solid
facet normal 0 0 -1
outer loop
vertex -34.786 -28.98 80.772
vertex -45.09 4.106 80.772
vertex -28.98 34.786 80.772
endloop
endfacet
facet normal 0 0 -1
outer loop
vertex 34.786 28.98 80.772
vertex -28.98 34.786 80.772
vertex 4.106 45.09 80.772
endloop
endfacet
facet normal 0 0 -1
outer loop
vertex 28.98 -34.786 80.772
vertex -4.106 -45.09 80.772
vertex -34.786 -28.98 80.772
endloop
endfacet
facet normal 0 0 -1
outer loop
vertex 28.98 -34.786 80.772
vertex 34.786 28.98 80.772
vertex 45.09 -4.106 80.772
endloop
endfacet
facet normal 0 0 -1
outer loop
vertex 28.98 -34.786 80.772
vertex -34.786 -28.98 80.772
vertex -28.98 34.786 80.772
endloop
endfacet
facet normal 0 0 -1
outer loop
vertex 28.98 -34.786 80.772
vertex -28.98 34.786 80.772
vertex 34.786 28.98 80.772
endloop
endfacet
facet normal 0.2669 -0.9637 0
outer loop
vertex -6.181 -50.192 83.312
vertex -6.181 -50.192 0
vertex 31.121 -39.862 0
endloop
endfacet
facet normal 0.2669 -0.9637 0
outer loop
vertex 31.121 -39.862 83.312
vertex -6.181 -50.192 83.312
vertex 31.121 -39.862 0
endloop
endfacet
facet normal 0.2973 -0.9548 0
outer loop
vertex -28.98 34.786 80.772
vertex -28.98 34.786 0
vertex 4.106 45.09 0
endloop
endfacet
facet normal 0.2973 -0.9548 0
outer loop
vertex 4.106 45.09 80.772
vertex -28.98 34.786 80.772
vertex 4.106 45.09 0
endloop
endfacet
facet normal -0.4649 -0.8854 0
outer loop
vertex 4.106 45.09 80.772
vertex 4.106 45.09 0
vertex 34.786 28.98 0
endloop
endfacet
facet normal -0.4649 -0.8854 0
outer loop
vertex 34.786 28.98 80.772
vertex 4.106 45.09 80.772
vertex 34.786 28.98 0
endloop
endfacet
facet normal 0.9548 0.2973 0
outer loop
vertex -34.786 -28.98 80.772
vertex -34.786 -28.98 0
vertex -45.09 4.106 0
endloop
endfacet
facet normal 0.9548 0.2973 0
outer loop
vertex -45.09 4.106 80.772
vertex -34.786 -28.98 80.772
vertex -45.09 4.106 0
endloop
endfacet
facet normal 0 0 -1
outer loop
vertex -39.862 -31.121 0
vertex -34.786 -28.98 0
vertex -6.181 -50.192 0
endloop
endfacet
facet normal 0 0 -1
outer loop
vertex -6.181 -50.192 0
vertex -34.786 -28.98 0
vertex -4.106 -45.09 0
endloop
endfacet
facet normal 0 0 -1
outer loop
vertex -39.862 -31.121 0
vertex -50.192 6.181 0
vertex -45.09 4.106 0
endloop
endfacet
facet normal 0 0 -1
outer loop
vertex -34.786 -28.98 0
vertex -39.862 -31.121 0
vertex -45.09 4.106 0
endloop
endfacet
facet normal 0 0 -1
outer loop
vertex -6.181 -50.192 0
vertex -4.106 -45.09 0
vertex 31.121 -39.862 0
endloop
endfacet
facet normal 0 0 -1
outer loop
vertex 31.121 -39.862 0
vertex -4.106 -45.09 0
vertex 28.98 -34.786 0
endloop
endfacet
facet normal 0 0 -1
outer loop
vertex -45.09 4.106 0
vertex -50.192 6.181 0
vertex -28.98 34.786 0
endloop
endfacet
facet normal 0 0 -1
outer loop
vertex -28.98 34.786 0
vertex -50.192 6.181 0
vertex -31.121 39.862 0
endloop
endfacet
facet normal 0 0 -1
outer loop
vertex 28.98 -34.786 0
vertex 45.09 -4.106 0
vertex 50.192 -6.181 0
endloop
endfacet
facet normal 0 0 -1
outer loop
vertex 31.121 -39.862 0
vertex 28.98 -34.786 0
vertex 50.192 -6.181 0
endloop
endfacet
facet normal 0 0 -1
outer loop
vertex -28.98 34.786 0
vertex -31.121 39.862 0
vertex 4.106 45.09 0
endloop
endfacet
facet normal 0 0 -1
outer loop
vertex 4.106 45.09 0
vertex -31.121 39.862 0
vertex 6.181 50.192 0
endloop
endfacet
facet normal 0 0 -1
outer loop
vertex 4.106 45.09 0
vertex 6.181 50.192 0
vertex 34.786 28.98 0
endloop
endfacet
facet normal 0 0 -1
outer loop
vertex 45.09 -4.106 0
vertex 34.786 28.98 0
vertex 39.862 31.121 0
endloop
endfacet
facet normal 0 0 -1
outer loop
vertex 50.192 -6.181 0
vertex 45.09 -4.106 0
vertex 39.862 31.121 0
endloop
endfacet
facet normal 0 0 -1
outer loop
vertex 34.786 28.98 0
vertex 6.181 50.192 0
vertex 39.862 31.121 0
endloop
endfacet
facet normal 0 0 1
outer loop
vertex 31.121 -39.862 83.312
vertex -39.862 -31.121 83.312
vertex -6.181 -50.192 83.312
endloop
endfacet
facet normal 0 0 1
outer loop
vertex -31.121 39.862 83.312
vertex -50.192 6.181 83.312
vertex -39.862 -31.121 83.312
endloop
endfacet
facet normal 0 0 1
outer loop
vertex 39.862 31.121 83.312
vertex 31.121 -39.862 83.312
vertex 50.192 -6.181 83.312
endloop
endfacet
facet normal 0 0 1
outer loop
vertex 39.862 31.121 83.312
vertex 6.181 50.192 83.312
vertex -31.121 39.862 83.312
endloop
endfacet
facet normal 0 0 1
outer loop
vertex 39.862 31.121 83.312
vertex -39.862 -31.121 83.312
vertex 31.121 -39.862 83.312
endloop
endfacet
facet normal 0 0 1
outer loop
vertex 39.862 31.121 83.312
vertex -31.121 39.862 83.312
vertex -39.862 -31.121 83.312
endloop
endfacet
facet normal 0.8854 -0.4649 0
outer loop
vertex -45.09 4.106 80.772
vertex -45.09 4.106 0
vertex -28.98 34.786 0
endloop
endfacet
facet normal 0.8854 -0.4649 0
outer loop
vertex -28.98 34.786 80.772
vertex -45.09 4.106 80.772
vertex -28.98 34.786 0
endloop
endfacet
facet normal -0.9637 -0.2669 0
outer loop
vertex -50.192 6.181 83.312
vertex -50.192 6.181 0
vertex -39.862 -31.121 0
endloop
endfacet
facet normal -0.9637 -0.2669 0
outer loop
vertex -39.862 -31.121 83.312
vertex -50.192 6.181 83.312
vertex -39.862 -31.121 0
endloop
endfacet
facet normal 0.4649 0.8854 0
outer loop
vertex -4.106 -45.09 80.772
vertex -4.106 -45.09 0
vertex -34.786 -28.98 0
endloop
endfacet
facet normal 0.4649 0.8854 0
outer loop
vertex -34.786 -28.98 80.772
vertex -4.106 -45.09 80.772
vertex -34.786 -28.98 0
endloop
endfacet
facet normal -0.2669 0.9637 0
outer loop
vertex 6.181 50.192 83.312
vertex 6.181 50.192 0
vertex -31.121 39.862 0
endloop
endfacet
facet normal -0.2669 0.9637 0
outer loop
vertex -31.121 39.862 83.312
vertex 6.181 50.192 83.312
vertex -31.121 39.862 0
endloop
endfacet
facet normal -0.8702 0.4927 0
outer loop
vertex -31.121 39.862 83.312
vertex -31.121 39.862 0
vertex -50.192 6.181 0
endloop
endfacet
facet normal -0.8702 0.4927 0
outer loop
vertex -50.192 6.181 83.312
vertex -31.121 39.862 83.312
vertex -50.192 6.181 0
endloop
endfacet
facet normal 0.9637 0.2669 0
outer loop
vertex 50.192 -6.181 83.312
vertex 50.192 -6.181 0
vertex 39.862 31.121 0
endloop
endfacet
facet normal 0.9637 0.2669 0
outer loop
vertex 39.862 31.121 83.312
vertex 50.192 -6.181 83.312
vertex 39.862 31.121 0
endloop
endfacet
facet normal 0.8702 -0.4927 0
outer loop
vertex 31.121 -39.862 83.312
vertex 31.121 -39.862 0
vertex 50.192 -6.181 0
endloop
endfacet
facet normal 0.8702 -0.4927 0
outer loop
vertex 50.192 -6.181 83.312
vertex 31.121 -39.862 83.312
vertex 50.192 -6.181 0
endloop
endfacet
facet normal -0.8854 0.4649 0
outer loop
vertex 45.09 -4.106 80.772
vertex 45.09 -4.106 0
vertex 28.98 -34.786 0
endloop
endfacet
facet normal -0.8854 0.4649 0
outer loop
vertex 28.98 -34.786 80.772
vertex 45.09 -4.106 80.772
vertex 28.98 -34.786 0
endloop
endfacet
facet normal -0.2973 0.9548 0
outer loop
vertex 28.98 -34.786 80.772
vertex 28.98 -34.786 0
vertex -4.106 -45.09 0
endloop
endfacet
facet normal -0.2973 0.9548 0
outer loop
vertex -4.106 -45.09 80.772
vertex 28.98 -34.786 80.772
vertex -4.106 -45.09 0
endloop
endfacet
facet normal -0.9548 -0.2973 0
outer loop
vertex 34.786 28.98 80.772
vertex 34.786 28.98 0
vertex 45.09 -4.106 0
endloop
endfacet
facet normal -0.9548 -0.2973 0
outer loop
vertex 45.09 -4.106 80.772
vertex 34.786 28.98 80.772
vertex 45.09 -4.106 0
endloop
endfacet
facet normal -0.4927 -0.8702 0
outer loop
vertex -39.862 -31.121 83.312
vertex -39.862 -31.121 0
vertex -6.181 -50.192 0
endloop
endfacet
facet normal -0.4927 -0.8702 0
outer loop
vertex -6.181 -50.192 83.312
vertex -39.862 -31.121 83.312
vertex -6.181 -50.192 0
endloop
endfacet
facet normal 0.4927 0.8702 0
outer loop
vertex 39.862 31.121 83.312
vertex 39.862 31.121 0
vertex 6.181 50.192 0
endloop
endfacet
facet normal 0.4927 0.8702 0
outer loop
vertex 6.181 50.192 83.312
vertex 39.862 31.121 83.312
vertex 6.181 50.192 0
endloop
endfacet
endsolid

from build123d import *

# Parameters (mm, degrees)
F1_DEPTH = 83.312
F3_DEPTH = 80.772


with BuildPart() as f1:
    # F0 (on Top) → F1 (new body)
    with BuildSketch(Plane.XY):
        Polygon((-31.120799, 39.861828), (-50.192297, 6.180841), (-39.861828, -31.120799), (-6.180841, -50.192297), (31.120799, -39.861828), (50.192297, -6.180841), (39.861828, 31.120799), (6.180841, 50.192297), align=None)
    extrude(amount=F1_DEPTH)

    # F2 (on face) → F3 (cut)
    with BuildSketch(Plane(origin=(0, 0, 0), x_dir=(1, 0, 0), z_dir=(0, 0, -1))):
        Polygon((-4.10583, 45.089582), (-34.786409, 28.979889), (-45.089582, -4.10583), (-28.979889, -34.786409), (4.10583, -45.089582), (34.786409, -28.979889), (45.089582, 4.10583), (28.979889, 34.786409), align=None)
    extrude(amount=-F3_DEPTH, mode=Mode.SUBTRACT)


solid = f1.part
